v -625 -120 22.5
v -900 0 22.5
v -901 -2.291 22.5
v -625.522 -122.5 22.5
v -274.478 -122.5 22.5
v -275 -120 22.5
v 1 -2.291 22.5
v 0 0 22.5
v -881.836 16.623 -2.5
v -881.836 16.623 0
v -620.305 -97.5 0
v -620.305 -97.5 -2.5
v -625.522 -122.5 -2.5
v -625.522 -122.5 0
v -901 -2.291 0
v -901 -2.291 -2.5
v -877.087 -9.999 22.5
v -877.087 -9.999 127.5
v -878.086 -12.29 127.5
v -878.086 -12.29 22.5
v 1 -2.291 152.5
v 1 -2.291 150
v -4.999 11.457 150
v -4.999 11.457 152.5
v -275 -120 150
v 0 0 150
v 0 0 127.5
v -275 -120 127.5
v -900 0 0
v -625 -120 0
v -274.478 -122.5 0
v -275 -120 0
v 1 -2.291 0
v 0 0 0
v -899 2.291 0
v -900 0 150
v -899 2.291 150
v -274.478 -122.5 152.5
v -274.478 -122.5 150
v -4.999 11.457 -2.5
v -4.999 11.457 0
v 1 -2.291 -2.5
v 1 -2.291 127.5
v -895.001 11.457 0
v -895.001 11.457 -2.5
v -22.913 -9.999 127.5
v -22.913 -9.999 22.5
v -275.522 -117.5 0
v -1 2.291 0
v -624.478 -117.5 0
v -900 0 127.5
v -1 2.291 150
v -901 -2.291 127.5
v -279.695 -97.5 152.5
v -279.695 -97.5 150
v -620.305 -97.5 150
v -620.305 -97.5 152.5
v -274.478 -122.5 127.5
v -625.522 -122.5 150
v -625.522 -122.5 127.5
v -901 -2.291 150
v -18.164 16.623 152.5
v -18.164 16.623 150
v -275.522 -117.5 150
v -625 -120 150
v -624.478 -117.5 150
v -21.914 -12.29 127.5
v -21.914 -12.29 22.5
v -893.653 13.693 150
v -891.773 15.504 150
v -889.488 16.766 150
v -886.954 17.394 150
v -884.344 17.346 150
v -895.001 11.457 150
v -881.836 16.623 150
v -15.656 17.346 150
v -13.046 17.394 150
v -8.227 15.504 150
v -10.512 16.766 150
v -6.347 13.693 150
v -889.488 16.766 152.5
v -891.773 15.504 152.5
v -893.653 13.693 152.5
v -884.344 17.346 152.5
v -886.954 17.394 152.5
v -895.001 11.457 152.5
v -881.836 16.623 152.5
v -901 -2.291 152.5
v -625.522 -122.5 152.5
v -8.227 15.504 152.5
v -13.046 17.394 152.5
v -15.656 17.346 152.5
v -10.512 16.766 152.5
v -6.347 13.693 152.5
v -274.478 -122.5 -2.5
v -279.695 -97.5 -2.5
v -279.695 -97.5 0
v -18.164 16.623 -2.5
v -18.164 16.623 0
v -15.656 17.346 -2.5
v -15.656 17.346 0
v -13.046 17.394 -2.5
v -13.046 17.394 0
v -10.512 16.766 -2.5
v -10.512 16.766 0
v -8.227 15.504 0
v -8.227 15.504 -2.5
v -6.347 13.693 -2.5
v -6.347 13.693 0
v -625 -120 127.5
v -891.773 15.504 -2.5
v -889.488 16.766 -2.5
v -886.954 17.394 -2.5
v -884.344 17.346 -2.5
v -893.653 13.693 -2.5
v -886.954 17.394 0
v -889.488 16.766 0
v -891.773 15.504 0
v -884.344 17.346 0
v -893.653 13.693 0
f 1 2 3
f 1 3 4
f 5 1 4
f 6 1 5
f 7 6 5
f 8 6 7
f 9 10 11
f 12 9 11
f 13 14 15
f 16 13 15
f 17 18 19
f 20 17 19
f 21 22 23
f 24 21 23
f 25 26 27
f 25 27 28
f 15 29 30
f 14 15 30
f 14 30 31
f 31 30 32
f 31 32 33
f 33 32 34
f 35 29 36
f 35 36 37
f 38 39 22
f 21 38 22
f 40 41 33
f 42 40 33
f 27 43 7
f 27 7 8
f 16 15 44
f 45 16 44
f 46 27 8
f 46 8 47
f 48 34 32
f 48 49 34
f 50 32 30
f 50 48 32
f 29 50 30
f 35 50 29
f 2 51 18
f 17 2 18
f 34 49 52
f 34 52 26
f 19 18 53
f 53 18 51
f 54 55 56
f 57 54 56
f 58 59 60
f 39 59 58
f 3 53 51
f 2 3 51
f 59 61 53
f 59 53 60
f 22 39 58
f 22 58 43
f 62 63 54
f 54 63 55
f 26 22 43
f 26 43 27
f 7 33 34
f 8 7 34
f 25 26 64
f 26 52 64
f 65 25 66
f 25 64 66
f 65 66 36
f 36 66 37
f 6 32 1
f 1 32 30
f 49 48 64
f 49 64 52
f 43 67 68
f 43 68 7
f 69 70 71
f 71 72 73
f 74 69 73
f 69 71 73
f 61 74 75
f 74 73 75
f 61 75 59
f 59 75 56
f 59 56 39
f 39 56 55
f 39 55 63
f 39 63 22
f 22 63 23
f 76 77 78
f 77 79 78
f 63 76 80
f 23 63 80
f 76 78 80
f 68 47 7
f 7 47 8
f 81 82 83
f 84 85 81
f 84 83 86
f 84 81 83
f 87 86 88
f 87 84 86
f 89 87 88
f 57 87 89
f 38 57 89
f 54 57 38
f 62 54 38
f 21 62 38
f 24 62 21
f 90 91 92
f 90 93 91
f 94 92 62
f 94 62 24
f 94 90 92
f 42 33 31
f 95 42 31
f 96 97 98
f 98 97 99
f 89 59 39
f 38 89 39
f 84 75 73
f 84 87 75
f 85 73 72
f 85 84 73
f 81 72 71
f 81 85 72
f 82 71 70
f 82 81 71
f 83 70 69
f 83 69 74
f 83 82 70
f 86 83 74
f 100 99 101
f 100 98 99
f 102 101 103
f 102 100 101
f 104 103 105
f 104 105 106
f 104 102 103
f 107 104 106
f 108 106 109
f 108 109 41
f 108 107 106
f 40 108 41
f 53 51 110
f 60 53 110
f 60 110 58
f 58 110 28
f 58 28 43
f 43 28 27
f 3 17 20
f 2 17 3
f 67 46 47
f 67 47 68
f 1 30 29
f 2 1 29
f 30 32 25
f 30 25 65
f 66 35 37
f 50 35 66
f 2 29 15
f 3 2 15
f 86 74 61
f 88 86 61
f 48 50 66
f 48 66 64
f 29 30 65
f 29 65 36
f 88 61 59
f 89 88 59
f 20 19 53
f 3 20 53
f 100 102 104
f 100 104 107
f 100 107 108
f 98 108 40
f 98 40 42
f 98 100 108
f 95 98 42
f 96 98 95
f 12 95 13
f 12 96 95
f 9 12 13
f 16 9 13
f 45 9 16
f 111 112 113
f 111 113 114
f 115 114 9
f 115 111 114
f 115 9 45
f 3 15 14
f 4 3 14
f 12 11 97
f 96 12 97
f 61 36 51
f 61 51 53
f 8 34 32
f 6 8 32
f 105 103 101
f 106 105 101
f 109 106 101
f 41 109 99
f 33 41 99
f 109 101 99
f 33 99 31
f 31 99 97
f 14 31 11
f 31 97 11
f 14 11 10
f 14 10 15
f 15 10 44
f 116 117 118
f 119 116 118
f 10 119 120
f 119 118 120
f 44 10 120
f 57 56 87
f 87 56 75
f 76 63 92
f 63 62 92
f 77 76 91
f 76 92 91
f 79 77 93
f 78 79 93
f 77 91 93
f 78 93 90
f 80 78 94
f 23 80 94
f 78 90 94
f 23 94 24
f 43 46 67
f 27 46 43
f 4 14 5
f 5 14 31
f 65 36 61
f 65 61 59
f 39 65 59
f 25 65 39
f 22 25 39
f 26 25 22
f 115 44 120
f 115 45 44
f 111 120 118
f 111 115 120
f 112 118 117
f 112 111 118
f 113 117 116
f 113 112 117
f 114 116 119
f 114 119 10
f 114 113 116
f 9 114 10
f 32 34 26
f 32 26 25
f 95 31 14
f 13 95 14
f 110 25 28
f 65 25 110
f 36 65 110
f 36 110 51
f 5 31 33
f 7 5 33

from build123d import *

# Parameters (mm, degrees)
BOSS_EXTRU_1_DEPTH   = 150
BOSS_EXTRU_2_DEPTH   = 22.5
BOSS_EXTRU_3_DEPTH   = 22.5
BOSS_EXTRU_4_DEPTH   = 105
BOSS_EXTRU_4_2_DEPTH = 105
BOSS_EXTRU_5_DEPTH   = 2.5
BOSS_EXTRU_6_DEPTH   = 2.5
CONG_1_R             = 10
CONG_2_R             = 10
CONG_3_R             = 10
CONG_4_R             = 10


with BuildPart() as part:
    # Esquisse1 → Boss.-Extru.1 (new body)
    with BuildSketch(Plane.XY):
        Polygon((0, 0), (-275, -120), (-625, -120), (-900, 0), (-899.00013886, 2.291348446), (-624.478298671, -117.5), (-275.521701329, -117.5), (-0.99986114, 2.291348446), align=None)
    extrude(amount=BOSS_EXTRU_1_DEPTH)


with BuildPart() as body_2:
    # Esquisse2 → Boss.-Extru.2 (new body)
    with BuildSketch(Plane(origin=(0, 0, 0), x_dir=(-1, 0, 0), z_dir=(0, 0, -1))):
        Polygon((0, 0), (275, -120), (625, -120), (900, 0), (900.99986114, -2.291348446), (625.521701329, -122.5), (274.478298671, -122.5), (-0.99986114, -2.291348446), align=None)
    extrude(amount=-BOSS_EXTRU_2_DEPTH)


with BuildPart() as body_3:
    # Esquisse3 → Boss.-Extru.3 (new body)
    with BuildSketch(Plane.XY.offset(150)):
        Polygon((-900, 0), (-900.99986114, -2.291348446), (-625.521701329, -122.5), (-274.478298671, -122.5), (0.99986114, -2.291348446), (0, 0), (-275, -120), (-625, -120), align=None)
    extrude(amount=-BOSS_EXTRU_3_DEPTH)


with BuildPart() as body_4:
    # Esquisse4 → Boss.-Extru.4 (new body)
    with BuildSketch(Plane(origin=(0, 0, 127.5), x_dir=(-1, 0, 0), z_dir=(0, 0, -1))):
        Polygon((900.99986114, -2.291348446), (900, 0), (877.086515541, -9.9986114), (878.086376681, -12.289959846), align=None)
    extrude(amount=BOSS_EXTRU_4_DEPTH)


with BuildPart() as body_5:
    # Esquisse4 → Boss.-Extru.4 2 (new body)
    with BuildSketch(Plane(origin=(0, 0, 127.5), x_dir=(-1, 0, 0), z_dir=(0, 0, -1))):
        Polygon((-0.99986114, -2.291348446), (0, 0), (22.913484459, -9.9986114), (21.913623319, -12.289959846), align=None)
    extrude(amount=BOSS_EXTRU_4_2_DEPTH)


with BuildPart() as body_6:
    # Esquisse5 → Boss.-Extru.5 (new body)
    with BuildSketch(Plane.XY.offset(150)):
        Polygon((0.99986114, -2.291348446), (-8.99875026, 20.622136013), (-279.695311958, -97.5), (-620.304688042, -97.5), (-891.00124974, 20.622136013), (-900.99986114, -2.291348446), (-625.521701329, -122.5), (-274.478298671, -122.5), align=None)
    extrude(amount=BOSS_EXTRU_5_DEPTH)

    # Congé2
    cong_2_edges = [body_6.edges().sort_by_distance(p)[0] for p in [
        (-891.00124974, 20.622136013, 151.25),
    ]]
    fillet(cong_2_edges, radius=CONG_2_R)

    # Congé3
    cong_3_edges = [body_6.edges().sort_by_distance(p)[0] for p in [
        (-8.99875026, 20.622136013, 151.25),
    ]]
    fillet(cong_3_edges, radius=CONG_3_R)


with BuildPart() as body_7:
    # Esquisse6 → Boss.-Extru.6 (new body)
    with BuildSketch(Plane(origin=(0, 0, 0), x_dir=(-1, 0, 0), z_dir=(0, 0, -1))):
        Polygon((8.99875026, 20.622136013), (-0.99986114, -2.291348446), (274.478298671, -122.5), (625.521701329, -122.5), (900.99986114, -2.291348446), (891.00124974, 20.622136013), (620.304688042, -97.5), (279.695311958, -97.5), align=None)
    extrude(amount=BOSS_EXTRU_6_DEPTH)

    # Congé1
    cong_1_edges = [body_7.edges().sort_by_distance(p)[0] for p in [
        (-891.00124974, 20.622136013, -1.25),
    ]]
    fillet(cong_1_edges, radius=CONG_1_R)

    # Congé4
    cong_4_edges = [body_7.edges().sort_by_distance(p)[0] for p in [
        (-8.99875026, 20.622136013, -1.25),
    ]]
    fillet(cong_4_edges, radius=CONG_4_R)


solid = Compound([part.part, body_2.part, body_3.part, body_4.part, body_5.part, body_6.part, body_7.part])
